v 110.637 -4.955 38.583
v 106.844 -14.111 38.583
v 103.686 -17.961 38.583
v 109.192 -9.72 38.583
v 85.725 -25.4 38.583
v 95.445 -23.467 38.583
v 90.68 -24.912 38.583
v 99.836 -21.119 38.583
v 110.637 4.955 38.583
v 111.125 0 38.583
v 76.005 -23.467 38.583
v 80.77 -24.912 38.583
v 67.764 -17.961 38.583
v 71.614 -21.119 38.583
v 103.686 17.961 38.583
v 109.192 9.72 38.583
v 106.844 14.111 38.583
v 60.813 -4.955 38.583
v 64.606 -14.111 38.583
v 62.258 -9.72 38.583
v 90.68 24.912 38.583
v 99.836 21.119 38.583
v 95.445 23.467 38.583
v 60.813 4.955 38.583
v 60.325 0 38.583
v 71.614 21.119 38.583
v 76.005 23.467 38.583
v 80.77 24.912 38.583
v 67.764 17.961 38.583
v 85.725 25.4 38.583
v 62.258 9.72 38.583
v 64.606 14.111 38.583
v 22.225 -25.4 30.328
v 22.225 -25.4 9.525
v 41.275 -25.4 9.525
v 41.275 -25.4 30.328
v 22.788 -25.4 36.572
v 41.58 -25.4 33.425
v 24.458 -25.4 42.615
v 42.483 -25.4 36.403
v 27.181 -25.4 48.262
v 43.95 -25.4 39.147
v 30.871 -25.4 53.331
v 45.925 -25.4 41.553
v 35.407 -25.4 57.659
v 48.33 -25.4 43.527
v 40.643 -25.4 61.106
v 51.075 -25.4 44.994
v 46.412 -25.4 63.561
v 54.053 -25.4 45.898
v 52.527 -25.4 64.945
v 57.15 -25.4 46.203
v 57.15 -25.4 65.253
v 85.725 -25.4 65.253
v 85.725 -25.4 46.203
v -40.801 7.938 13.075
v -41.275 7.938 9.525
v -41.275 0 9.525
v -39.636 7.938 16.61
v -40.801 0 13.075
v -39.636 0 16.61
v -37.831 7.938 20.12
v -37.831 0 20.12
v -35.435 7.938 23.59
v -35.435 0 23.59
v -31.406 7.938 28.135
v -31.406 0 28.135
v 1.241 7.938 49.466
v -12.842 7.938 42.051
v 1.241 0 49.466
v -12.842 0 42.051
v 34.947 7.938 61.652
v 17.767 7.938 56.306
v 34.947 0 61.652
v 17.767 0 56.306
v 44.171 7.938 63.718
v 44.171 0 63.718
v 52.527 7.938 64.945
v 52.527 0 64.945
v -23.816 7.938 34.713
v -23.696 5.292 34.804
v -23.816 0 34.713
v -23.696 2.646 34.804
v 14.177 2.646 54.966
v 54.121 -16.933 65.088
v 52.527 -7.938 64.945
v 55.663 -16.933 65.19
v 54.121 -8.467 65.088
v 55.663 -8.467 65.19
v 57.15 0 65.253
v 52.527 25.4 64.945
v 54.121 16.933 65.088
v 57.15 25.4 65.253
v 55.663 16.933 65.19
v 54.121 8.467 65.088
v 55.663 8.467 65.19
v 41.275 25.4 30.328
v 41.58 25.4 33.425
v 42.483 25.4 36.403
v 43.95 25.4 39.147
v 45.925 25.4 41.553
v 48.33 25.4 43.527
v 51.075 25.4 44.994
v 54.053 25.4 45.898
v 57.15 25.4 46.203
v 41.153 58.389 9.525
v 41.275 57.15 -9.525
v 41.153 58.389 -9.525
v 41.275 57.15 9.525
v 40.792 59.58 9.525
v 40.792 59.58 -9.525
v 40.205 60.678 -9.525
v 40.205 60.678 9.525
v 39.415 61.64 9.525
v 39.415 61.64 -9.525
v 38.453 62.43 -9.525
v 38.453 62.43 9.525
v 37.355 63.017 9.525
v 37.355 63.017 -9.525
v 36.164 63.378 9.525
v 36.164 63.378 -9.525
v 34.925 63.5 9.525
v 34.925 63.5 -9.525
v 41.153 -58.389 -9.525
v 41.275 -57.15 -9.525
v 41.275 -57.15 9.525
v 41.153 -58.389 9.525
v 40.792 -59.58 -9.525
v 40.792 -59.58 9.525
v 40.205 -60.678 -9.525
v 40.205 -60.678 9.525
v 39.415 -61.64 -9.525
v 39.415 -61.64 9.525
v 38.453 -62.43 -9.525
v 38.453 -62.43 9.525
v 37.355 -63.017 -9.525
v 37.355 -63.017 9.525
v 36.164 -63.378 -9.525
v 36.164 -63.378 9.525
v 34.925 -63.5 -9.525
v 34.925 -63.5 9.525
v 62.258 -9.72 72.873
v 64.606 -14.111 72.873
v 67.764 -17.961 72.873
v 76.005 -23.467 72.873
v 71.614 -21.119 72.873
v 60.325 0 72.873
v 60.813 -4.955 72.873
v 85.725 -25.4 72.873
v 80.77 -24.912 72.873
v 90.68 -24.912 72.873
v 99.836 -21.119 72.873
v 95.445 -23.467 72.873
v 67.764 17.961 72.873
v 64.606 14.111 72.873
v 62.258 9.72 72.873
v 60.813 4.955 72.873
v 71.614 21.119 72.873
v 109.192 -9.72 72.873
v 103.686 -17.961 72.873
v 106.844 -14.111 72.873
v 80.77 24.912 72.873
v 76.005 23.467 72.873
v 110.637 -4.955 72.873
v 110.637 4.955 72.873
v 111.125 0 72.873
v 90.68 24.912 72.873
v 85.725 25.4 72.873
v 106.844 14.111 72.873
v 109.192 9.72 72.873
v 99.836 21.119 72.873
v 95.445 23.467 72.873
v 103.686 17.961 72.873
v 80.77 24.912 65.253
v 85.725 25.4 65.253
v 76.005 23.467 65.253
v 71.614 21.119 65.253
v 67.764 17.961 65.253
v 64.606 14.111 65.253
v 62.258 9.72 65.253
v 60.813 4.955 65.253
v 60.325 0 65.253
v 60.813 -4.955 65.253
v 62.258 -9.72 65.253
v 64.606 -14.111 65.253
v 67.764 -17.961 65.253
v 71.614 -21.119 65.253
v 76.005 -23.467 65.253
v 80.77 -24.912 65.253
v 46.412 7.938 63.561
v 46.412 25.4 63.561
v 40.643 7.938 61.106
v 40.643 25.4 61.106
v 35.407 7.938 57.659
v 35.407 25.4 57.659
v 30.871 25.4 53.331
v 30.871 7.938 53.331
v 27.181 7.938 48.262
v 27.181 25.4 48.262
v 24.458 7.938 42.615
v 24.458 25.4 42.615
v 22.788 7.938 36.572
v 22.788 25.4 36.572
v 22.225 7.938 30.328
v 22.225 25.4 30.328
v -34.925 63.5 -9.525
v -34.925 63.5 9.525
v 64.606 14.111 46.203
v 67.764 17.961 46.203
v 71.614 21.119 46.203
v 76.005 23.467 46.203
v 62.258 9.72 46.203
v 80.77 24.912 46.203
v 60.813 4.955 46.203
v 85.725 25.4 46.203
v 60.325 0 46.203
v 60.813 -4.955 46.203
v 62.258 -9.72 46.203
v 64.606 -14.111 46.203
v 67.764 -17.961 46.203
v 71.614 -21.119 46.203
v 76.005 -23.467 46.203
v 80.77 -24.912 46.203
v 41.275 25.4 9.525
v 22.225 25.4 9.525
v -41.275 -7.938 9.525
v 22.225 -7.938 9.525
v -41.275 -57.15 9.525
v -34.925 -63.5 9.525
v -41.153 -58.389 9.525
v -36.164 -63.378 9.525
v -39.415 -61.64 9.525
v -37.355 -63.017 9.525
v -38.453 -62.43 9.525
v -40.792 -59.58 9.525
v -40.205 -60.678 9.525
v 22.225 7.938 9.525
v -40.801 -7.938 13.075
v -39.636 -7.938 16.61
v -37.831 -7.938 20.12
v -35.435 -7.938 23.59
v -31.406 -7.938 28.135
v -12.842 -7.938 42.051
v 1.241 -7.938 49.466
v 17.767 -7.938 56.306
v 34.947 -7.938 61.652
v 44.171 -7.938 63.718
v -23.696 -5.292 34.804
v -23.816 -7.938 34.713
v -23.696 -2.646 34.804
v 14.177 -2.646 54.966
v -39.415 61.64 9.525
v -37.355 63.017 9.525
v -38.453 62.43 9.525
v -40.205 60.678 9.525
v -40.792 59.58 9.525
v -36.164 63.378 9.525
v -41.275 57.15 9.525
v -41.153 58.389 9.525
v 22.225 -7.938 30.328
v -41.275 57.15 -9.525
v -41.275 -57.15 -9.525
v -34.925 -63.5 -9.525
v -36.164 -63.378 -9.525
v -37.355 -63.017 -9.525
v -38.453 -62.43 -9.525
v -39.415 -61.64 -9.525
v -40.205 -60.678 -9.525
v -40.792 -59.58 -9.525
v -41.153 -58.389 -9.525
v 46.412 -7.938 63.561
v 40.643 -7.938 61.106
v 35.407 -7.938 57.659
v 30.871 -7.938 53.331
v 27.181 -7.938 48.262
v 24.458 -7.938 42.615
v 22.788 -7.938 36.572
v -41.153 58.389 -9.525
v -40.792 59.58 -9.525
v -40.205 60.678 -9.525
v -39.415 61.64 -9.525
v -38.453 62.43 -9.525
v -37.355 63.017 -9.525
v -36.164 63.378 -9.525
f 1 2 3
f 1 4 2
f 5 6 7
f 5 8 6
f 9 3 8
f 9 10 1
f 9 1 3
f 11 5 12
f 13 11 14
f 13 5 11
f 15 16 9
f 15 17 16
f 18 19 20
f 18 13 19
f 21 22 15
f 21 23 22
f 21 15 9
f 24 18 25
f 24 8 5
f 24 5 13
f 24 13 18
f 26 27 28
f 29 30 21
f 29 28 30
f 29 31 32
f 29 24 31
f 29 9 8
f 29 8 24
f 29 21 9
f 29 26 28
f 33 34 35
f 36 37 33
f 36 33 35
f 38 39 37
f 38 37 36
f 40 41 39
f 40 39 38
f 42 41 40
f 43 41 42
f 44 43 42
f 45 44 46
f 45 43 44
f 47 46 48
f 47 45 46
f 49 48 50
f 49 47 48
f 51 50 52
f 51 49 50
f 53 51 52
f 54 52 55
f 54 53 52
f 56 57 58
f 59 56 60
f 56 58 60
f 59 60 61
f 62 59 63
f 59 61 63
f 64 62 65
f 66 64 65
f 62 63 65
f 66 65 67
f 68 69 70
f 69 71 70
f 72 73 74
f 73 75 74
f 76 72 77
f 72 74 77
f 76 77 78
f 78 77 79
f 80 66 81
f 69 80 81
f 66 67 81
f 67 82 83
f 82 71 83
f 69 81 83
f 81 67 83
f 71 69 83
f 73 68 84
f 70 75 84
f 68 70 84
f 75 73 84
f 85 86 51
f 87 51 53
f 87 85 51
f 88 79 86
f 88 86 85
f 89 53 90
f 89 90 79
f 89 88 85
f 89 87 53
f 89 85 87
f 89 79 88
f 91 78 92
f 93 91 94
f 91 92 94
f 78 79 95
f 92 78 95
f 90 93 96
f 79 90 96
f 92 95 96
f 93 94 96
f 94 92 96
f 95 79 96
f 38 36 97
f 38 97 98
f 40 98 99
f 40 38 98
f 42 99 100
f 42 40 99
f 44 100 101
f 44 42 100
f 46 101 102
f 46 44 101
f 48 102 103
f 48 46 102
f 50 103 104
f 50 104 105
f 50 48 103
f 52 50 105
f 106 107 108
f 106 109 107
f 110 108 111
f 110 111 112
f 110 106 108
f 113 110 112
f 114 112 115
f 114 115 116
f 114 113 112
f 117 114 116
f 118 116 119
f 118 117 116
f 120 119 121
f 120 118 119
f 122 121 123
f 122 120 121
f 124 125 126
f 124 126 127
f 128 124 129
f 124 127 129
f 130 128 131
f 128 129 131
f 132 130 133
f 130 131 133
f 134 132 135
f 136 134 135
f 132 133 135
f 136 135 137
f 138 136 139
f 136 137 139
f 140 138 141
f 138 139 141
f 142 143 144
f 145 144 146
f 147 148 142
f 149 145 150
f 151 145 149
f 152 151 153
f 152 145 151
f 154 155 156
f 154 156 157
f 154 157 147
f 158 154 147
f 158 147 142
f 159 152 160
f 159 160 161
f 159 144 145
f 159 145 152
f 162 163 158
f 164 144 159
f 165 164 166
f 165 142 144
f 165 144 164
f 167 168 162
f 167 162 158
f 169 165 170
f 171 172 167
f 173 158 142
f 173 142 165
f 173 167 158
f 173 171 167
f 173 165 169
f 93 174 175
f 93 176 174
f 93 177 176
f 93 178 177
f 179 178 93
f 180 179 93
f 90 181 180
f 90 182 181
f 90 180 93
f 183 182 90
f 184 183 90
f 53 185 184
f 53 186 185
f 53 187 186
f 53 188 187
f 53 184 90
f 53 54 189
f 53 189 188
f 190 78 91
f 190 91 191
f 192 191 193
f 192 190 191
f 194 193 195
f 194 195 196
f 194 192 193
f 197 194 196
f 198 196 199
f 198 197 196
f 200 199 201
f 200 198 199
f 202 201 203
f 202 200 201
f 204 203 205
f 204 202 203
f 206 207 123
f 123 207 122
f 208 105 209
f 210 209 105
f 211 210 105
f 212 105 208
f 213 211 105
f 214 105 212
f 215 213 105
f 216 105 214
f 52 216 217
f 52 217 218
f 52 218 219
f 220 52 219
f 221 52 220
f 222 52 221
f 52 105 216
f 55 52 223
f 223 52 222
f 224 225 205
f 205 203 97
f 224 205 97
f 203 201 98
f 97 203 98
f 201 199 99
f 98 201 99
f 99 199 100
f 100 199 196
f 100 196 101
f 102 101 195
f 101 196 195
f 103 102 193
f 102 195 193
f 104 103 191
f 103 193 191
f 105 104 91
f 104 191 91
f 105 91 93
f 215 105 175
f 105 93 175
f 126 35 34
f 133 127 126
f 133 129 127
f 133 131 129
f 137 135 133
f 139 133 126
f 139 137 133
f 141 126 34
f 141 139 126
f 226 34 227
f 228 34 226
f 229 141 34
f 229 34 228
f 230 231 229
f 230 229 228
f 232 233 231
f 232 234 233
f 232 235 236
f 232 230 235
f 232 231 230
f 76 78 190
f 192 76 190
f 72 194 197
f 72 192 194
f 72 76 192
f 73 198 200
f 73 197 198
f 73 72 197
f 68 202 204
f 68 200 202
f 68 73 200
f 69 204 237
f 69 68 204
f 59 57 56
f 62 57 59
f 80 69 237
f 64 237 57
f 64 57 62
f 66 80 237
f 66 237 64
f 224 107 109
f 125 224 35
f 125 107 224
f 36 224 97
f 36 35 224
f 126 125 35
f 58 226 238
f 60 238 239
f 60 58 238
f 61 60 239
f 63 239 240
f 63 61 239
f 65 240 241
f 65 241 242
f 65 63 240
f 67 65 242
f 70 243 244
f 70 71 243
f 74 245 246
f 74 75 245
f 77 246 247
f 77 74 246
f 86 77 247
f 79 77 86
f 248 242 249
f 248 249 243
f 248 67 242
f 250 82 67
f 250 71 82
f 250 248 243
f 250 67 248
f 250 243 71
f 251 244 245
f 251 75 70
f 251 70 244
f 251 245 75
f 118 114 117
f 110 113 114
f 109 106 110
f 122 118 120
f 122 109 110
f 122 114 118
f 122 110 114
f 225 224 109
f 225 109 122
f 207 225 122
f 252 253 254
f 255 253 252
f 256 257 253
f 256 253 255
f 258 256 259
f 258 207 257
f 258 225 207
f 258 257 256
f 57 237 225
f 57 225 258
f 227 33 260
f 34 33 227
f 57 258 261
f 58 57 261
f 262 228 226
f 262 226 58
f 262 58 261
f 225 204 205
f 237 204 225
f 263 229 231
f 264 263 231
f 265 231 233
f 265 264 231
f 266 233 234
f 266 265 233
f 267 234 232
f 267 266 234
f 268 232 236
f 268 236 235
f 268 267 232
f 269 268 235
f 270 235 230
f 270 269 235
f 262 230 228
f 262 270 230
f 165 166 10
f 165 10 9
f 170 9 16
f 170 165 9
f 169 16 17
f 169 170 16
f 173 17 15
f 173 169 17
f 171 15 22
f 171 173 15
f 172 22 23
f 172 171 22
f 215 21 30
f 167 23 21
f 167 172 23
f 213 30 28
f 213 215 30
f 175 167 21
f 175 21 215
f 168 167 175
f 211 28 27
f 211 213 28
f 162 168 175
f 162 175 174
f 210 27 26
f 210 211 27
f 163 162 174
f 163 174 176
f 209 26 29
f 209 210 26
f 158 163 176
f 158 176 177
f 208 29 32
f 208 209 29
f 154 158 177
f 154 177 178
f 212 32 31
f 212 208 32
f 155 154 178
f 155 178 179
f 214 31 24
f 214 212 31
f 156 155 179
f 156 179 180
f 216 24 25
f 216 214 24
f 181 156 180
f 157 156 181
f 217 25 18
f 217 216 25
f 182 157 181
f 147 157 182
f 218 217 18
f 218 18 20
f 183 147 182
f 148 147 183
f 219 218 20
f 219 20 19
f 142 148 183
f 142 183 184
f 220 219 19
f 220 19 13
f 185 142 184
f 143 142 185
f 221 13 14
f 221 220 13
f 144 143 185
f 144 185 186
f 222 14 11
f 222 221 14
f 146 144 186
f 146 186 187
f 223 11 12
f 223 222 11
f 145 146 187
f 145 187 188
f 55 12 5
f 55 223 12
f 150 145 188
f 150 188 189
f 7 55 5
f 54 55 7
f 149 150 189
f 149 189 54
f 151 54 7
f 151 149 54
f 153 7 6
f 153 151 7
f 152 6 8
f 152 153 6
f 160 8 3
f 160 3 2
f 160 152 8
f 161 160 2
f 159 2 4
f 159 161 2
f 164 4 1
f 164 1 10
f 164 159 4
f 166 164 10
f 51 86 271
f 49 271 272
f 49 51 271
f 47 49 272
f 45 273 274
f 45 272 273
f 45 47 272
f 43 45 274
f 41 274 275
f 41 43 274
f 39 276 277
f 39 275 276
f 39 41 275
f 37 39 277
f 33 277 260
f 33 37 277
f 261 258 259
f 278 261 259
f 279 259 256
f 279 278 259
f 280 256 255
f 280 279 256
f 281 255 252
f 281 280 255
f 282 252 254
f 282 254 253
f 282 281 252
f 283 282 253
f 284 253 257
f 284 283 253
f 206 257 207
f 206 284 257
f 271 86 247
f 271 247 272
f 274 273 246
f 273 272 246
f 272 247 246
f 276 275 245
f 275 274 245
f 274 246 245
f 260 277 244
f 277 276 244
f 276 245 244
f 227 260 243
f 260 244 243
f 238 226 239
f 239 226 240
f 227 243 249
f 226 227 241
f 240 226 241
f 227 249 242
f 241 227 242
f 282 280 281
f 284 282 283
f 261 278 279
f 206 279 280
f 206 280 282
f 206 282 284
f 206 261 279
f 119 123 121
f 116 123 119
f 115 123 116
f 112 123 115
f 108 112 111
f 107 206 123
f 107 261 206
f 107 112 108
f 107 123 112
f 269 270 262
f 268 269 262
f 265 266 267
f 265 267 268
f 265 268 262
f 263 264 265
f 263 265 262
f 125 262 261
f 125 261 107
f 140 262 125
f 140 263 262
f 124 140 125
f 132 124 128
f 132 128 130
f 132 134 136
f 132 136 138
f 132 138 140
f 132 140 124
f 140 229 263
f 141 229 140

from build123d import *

# Parameters (mm, degrees)
F1_DEPTH = 63.5
F2_DEPTH = 25.4
F3_DEPTH = 7.9375
F5_R     = 6.35


with BuildPart() as f1:
    # F0 (on Front) → F1 (new body, symmetric)
    with BuildSketch(Plane.XZ):
        Polygon((22.225, 9.525), (-41.275, 9.525), (-41.275, -9.525), (41.275, -9.525), (41.275, 9.525), align=None)
    extrude(amount=F1_DEPTH, both=True)

    # F0 (on Front) → F2 (join, symmetric)
    with BuildSketch(Plane.XZ):
        with BuildLine():
            Line((22.225, 30.3276), (22.225, 9.525))
            Line((22.225, 9.525), (41.275, 9.525))
            Line((41.275, 9.525), (41.275, 30.3276))
            ThreePointArc((41.275, 30.3276), (45.92468, 41.55292), (57.15, 46.2026))
            Line((57.15, 46.2026), (60.325, 46.2026))
            Line((60.325, 46.2026), (60.325, 65.2526))
            Line((60.325, 65.2526), (57.15, 65.2526))
            add(Edge.make_bspline(
                [(52.526729, 64.94524), (54.14604, 65.1073), (55.690988, 65.21074), (57.15, 65.2526)],
                knots=[107.655692, 107.655692, 107.655692, 107.655692, 113.106348, 113.106348, 113.106348, 113.106348], degree=3))
            ThreePointArc((52.526729, 64.94524), (30.870508, 53.330729), (22.225, 30.3276))
        make_face()
        Polygon((85.725, 65.2526), (60.325, 65.2526), (60.325, 46.2026), (85.725, 46.2026), (85.725, 52.8701), align=None)
    extrude(amount=F2_DEPTH, both=True)

    # F0 (on Front) → F3 (join, symmetric)
    with BuildSketch(Plane.XZ):
        with BuildLine():
            add(Edge.make_bspline(
                [(-41.275, 9.525), (-40.448051, 35.67537), (20.543785, 61.74439), (52.526729, 64.94524)],
                knots=[0, 0, 0, 0, 107.655692, 107.655692, 107.655692, 107.655692], degree=3))
            Line((-41.275, 9.525), (22.225, 9.525))
            Line((22.225, 9.525), (22.225, 30.3276))
            ThreePointArc((22.225, 30.3276), (30.870508, 53.330729), (52.526729, 64.94524))
        make_face()
    extrude(amount=F3_DEPTH, both=True)

    # F0 (on Front) → F4 (revolve)
    with BuildSketch(Plane.XZ):
        Polygon((85.725, 67.1576), (85.725, 65.2526), (85.725, 52.8701), (85.725, 46.2026), (85.725, 38.5826), (111.125, 38.5826), (111.125, 44.2976), (111.125, 67.1576), (111.125, 72.8726), (85.725, 72.8726), align=None)
    revolve(axis=Axis((85.725, 0, 60.01385), (0, 0, 1)))

    # F5
    f5_edges = [f1.edges().sort_by_distance(p)[0] for p in [
        (41.275, -63.5, 0),
        (41.275, 63.5, 0),
        (-41.275, 63.5, 0),
        (-41.275, -63.5, 0),
    ]]
    fillet(f5_edges, radius=F5_R)


solid = f1.part
